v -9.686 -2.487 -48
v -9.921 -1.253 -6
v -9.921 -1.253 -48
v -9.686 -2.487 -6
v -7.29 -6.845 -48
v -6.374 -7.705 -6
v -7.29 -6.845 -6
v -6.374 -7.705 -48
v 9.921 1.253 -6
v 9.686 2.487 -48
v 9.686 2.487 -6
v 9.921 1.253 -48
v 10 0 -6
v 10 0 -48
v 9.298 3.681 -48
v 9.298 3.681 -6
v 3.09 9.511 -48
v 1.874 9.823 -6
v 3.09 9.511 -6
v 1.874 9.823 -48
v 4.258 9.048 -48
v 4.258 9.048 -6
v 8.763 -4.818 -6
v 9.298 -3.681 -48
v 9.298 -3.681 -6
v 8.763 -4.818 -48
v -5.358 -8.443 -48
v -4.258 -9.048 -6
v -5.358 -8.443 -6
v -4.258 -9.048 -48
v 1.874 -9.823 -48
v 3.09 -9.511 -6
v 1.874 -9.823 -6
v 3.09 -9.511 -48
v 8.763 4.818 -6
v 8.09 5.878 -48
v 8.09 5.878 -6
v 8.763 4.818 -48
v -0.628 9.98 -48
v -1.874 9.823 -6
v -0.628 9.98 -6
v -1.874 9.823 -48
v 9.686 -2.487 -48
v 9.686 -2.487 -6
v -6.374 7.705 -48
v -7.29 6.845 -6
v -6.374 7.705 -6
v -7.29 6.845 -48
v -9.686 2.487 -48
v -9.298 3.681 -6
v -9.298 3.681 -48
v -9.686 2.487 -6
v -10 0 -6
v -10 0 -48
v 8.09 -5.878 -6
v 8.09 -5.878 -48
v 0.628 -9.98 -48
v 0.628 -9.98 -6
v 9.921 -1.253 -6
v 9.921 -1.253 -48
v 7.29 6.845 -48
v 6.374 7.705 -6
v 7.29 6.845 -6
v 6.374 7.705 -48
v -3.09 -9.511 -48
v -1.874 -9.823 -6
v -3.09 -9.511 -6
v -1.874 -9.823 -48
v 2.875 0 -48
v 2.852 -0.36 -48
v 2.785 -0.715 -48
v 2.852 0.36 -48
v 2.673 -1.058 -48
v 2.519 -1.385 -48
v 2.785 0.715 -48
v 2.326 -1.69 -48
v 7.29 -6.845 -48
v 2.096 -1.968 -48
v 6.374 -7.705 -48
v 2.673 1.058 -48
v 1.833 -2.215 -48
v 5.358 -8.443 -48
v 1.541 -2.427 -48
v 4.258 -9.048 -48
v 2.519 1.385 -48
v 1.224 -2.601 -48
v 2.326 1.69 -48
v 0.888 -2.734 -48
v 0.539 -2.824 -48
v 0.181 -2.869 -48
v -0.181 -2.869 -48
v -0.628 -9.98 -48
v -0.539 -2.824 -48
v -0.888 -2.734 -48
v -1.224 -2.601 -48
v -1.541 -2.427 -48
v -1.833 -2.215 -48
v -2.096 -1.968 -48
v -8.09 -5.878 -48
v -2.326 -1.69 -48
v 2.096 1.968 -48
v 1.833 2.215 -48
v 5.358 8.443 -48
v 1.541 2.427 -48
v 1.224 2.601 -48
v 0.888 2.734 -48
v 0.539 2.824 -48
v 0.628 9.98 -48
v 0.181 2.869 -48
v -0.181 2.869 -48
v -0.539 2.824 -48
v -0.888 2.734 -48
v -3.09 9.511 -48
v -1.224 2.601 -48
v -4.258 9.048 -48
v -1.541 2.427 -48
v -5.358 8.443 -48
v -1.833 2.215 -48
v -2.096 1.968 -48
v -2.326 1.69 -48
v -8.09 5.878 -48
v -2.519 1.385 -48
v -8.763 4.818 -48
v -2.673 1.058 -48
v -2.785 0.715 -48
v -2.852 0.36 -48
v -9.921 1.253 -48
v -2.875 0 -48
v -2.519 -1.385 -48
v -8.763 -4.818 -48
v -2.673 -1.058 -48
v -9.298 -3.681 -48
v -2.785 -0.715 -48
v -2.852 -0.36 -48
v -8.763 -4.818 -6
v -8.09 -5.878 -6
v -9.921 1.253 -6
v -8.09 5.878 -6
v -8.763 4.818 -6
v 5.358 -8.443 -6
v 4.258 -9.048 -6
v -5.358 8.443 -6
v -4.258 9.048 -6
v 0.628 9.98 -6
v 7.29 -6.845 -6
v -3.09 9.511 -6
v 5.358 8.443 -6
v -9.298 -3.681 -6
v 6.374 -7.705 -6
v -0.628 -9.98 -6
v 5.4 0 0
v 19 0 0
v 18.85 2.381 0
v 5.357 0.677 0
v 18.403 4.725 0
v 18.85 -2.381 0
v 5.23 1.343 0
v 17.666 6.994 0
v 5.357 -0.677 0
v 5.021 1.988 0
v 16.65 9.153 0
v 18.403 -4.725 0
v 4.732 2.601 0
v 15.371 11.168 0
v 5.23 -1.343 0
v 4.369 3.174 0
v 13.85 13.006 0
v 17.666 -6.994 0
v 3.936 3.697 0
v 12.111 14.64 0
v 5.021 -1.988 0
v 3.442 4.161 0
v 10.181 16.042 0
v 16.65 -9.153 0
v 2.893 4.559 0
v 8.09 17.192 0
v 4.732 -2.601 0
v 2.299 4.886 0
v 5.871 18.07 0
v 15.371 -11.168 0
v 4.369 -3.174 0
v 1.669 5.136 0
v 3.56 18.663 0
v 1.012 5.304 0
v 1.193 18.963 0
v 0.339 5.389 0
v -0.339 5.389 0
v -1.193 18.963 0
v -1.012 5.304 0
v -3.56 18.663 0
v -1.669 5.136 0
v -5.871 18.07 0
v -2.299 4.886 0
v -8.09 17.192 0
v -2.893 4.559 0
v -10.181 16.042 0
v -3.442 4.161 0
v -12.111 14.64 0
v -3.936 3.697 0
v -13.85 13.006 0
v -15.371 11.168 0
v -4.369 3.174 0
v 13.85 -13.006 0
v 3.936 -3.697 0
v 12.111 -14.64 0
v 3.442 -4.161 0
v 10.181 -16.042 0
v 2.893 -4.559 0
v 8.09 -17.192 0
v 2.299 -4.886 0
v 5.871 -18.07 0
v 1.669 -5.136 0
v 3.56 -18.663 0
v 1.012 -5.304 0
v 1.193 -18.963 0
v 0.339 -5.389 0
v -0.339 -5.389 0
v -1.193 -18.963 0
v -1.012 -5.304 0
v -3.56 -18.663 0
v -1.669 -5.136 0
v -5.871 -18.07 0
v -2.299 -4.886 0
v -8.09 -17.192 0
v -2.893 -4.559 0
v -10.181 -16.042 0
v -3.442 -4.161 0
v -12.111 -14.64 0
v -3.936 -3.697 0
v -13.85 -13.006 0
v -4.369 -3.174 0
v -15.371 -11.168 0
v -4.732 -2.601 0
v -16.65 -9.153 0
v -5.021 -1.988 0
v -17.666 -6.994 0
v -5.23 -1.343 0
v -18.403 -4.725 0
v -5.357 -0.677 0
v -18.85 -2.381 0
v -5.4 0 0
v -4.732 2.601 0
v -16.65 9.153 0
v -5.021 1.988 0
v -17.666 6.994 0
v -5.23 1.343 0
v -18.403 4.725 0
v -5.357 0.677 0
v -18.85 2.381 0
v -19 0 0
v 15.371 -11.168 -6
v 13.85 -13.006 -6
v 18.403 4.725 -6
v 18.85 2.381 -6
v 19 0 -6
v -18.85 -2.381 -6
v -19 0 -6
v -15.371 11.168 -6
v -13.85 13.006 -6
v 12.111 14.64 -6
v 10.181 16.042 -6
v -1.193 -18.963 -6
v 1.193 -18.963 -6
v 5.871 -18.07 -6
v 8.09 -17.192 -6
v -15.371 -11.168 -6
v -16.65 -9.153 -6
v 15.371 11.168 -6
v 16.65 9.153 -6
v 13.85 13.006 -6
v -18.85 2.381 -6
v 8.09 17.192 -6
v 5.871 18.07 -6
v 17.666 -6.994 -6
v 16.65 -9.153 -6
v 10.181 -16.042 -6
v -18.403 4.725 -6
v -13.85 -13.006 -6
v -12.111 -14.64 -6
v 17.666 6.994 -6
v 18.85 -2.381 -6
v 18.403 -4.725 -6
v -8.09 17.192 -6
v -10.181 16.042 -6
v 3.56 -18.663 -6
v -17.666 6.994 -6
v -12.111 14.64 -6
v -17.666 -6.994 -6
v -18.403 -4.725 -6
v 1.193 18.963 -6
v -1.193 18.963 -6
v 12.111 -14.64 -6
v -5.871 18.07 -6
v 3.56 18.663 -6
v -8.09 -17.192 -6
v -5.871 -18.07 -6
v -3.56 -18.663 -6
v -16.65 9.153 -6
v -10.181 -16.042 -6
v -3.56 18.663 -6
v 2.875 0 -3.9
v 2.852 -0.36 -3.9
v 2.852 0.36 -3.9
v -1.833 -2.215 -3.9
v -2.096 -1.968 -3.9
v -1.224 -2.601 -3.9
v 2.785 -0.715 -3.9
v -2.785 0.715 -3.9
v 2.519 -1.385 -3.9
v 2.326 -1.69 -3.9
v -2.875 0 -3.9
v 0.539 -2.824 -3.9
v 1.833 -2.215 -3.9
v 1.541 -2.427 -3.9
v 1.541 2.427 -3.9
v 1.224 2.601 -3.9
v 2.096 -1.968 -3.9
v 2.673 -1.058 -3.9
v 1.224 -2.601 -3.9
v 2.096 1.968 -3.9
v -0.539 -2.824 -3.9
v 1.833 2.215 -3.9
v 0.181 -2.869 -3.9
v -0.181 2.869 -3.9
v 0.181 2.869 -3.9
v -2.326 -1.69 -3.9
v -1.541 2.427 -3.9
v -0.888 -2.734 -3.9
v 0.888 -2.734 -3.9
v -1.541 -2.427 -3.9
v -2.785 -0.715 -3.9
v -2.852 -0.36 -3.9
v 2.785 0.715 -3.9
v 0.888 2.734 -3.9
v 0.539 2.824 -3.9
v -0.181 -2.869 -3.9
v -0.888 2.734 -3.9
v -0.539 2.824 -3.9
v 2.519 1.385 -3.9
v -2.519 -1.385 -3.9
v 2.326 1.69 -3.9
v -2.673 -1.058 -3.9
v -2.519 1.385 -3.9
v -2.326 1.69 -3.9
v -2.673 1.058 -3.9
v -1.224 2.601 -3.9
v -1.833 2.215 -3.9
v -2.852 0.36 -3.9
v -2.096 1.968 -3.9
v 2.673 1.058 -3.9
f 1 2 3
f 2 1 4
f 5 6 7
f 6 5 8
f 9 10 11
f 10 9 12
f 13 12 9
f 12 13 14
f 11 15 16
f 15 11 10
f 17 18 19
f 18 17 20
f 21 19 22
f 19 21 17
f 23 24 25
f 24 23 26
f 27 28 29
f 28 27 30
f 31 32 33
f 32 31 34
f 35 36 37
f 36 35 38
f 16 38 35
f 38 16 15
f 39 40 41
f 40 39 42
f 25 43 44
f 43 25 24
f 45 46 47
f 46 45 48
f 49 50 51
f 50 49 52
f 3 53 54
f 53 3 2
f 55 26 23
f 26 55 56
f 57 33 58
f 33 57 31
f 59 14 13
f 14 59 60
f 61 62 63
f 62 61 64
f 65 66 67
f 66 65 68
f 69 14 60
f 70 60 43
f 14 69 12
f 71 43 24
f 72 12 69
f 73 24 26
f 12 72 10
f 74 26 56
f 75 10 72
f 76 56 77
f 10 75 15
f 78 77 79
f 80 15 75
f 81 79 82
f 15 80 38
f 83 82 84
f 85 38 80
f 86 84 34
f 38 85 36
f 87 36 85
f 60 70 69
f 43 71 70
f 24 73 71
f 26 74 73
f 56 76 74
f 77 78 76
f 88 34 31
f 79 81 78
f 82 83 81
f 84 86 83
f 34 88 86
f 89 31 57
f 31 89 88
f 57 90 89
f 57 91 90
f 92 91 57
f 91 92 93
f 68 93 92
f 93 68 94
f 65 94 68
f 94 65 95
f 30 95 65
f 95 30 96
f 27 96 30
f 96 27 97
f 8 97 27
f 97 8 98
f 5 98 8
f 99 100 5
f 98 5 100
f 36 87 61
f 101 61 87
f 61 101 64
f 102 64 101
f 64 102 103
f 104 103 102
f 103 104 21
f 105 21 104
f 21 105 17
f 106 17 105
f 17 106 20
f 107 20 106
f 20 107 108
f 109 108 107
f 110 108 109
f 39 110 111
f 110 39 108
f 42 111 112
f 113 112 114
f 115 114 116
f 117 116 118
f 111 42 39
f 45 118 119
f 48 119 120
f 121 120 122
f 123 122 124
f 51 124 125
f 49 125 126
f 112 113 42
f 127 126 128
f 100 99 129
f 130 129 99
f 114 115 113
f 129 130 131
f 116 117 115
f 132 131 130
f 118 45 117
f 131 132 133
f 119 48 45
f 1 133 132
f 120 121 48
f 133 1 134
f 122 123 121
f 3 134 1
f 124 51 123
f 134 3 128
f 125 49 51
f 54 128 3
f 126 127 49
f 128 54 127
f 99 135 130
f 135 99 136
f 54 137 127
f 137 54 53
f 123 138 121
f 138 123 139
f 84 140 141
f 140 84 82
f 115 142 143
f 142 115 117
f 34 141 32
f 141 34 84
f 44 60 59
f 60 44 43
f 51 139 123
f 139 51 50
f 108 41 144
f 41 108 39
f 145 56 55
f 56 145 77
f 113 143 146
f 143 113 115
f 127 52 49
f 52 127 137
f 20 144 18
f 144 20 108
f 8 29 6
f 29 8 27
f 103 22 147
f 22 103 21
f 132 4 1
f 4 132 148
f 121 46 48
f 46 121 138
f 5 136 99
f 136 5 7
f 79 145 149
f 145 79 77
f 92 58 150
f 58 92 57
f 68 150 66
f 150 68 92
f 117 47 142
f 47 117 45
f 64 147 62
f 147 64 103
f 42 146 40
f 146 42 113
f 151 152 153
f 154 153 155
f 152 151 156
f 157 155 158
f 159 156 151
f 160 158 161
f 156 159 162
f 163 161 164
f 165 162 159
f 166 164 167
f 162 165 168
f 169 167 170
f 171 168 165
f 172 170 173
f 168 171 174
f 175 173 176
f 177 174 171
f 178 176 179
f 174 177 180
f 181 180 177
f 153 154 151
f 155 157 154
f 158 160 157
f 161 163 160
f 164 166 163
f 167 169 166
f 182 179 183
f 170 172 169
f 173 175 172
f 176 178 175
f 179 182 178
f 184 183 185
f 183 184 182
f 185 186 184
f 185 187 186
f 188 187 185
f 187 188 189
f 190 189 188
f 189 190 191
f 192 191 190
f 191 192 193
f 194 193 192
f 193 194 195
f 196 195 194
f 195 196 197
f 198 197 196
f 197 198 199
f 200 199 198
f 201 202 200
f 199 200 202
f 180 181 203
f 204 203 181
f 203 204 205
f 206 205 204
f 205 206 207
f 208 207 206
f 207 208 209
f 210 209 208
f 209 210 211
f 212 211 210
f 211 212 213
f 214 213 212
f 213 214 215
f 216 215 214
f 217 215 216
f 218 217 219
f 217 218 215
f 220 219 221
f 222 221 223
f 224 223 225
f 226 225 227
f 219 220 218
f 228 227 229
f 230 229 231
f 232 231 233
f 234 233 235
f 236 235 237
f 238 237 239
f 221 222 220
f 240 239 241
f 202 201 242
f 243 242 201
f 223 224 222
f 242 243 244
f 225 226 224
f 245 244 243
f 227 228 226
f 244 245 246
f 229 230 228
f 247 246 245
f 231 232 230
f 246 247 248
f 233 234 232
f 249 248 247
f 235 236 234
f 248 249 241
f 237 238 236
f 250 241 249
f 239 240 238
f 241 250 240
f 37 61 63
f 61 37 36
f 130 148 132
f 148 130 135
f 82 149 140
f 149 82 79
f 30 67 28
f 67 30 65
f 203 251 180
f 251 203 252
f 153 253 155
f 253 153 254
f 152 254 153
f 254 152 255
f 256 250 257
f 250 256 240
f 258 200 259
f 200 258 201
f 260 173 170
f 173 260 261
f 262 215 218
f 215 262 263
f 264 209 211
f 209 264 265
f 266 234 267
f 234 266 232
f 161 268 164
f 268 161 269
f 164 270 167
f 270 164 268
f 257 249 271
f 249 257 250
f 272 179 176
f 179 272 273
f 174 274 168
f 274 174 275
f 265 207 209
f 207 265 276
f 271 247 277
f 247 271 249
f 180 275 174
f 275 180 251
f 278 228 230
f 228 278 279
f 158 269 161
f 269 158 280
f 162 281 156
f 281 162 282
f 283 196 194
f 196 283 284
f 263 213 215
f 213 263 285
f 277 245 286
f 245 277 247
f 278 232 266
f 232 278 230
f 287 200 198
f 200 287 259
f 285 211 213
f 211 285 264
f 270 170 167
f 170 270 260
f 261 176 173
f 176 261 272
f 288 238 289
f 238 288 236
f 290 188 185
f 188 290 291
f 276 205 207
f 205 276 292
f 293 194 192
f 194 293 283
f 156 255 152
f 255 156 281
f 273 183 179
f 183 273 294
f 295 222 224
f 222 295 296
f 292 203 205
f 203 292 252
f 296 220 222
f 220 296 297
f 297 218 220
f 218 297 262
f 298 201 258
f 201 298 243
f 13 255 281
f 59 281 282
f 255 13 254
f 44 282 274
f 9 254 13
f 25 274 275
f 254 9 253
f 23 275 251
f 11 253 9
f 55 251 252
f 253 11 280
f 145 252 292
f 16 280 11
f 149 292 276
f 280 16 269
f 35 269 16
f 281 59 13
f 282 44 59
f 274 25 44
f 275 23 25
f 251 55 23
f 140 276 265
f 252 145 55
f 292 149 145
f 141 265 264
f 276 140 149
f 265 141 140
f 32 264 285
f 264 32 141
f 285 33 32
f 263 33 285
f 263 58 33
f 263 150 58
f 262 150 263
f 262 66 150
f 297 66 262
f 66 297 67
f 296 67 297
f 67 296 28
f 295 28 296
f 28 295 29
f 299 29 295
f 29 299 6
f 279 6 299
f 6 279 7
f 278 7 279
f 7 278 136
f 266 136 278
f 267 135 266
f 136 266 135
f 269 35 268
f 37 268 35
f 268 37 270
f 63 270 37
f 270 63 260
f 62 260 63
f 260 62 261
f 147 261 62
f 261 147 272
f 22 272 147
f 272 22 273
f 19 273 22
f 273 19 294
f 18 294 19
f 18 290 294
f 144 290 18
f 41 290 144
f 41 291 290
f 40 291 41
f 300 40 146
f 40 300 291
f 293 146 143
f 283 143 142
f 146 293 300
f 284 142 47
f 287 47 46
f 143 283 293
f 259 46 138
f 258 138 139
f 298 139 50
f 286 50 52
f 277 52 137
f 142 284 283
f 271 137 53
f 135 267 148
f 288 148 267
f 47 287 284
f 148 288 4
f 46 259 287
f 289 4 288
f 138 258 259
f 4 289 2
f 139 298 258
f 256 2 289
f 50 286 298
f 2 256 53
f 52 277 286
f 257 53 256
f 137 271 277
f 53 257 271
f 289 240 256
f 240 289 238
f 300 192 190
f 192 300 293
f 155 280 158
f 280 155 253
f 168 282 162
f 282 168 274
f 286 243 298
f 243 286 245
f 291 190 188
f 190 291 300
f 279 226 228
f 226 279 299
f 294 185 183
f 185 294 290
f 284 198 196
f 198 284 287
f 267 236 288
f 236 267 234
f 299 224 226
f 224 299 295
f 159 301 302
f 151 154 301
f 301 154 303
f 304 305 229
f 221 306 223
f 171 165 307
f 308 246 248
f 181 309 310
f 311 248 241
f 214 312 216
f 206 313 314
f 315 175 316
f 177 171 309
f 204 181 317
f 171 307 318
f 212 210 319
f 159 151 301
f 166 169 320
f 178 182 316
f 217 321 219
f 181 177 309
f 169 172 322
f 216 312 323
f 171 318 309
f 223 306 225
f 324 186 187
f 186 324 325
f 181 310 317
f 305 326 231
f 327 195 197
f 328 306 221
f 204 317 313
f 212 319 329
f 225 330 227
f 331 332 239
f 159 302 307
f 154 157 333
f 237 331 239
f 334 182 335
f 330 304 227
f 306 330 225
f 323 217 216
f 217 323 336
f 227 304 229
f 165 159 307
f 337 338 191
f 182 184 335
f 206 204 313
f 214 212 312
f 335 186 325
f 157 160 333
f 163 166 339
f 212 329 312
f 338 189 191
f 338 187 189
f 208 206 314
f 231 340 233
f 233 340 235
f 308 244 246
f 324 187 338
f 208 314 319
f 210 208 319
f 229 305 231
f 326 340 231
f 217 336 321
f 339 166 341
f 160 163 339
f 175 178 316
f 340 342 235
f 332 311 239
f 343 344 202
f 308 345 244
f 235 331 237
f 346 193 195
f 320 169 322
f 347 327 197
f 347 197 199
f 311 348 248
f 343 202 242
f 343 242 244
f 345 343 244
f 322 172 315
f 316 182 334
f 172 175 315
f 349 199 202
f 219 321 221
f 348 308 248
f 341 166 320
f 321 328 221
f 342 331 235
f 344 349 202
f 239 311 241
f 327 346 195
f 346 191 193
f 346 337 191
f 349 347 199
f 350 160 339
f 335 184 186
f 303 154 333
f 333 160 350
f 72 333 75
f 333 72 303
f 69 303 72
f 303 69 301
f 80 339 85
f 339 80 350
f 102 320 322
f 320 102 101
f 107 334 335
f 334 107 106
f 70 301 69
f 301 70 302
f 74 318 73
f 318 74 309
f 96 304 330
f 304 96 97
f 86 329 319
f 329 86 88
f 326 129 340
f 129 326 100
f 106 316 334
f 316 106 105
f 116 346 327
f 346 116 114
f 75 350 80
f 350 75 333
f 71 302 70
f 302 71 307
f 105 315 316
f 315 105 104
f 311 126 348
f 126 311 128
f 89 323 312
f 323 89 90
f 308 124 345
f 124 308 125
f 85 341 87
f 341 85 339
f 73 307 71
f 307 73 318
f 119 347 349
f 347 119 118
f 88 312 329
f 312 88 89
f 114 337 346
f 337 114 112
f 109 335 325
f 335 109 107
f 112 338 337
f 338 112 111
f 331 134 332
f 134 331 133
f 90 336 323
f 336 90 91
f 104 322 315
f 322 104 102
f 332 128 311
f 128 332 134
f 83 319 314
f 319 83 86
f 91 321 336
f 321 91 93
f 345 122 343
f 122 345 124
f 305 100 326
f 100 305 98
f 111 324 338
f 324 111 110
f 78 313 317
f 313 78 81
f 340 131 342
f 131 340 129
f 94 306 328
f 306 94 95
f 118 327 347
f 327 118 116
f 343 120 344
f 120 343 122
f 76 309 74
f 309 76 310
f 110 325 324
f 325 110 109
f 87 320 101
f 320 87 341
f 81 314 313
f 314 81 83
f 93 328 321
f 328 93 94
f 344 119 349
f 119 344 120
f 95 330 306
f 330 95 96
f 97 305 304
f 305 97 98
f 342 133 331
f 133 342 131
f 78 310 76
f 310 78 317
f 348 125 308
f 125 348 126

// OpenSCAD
$fn = 50;


difference() {
	union() {
		translate(v = [0, 0, -48.0000000000]) {
			cylinder(h = 48, r = 10.0000000000);
		}
		translate(v = [0, 0, -6.0000000000]) {
			cylinder(h = 6, r = 19.0000000000);
		}
	}
	union() {
		translate(v = [0, 0, 0]) {
			rotate(a = [0, 0, 0]) {
				difference() {
					union() {
						#translate(v = [0, 0, -48.0000000000]) {
							cylinder(h = 48, r = 2.6000000000);
						}
						#translate(v = [0, 0, -3.9000000000]) {
							cylinder(h = 3.9000000000, r1 = 2.8750000000, r2 = 5.4000000000);
						}
						#translate(v = [0, 0, -48.0000000000]) {
							cylinder(h = 48, r = 2.8750000000);
						}
						#translate(v = [0, 0, -48.0000000000]) {
							cylinder(h = 48, r = 2.6000000000);
						}
					}
					union();
				}
			}
		}
	}
}
